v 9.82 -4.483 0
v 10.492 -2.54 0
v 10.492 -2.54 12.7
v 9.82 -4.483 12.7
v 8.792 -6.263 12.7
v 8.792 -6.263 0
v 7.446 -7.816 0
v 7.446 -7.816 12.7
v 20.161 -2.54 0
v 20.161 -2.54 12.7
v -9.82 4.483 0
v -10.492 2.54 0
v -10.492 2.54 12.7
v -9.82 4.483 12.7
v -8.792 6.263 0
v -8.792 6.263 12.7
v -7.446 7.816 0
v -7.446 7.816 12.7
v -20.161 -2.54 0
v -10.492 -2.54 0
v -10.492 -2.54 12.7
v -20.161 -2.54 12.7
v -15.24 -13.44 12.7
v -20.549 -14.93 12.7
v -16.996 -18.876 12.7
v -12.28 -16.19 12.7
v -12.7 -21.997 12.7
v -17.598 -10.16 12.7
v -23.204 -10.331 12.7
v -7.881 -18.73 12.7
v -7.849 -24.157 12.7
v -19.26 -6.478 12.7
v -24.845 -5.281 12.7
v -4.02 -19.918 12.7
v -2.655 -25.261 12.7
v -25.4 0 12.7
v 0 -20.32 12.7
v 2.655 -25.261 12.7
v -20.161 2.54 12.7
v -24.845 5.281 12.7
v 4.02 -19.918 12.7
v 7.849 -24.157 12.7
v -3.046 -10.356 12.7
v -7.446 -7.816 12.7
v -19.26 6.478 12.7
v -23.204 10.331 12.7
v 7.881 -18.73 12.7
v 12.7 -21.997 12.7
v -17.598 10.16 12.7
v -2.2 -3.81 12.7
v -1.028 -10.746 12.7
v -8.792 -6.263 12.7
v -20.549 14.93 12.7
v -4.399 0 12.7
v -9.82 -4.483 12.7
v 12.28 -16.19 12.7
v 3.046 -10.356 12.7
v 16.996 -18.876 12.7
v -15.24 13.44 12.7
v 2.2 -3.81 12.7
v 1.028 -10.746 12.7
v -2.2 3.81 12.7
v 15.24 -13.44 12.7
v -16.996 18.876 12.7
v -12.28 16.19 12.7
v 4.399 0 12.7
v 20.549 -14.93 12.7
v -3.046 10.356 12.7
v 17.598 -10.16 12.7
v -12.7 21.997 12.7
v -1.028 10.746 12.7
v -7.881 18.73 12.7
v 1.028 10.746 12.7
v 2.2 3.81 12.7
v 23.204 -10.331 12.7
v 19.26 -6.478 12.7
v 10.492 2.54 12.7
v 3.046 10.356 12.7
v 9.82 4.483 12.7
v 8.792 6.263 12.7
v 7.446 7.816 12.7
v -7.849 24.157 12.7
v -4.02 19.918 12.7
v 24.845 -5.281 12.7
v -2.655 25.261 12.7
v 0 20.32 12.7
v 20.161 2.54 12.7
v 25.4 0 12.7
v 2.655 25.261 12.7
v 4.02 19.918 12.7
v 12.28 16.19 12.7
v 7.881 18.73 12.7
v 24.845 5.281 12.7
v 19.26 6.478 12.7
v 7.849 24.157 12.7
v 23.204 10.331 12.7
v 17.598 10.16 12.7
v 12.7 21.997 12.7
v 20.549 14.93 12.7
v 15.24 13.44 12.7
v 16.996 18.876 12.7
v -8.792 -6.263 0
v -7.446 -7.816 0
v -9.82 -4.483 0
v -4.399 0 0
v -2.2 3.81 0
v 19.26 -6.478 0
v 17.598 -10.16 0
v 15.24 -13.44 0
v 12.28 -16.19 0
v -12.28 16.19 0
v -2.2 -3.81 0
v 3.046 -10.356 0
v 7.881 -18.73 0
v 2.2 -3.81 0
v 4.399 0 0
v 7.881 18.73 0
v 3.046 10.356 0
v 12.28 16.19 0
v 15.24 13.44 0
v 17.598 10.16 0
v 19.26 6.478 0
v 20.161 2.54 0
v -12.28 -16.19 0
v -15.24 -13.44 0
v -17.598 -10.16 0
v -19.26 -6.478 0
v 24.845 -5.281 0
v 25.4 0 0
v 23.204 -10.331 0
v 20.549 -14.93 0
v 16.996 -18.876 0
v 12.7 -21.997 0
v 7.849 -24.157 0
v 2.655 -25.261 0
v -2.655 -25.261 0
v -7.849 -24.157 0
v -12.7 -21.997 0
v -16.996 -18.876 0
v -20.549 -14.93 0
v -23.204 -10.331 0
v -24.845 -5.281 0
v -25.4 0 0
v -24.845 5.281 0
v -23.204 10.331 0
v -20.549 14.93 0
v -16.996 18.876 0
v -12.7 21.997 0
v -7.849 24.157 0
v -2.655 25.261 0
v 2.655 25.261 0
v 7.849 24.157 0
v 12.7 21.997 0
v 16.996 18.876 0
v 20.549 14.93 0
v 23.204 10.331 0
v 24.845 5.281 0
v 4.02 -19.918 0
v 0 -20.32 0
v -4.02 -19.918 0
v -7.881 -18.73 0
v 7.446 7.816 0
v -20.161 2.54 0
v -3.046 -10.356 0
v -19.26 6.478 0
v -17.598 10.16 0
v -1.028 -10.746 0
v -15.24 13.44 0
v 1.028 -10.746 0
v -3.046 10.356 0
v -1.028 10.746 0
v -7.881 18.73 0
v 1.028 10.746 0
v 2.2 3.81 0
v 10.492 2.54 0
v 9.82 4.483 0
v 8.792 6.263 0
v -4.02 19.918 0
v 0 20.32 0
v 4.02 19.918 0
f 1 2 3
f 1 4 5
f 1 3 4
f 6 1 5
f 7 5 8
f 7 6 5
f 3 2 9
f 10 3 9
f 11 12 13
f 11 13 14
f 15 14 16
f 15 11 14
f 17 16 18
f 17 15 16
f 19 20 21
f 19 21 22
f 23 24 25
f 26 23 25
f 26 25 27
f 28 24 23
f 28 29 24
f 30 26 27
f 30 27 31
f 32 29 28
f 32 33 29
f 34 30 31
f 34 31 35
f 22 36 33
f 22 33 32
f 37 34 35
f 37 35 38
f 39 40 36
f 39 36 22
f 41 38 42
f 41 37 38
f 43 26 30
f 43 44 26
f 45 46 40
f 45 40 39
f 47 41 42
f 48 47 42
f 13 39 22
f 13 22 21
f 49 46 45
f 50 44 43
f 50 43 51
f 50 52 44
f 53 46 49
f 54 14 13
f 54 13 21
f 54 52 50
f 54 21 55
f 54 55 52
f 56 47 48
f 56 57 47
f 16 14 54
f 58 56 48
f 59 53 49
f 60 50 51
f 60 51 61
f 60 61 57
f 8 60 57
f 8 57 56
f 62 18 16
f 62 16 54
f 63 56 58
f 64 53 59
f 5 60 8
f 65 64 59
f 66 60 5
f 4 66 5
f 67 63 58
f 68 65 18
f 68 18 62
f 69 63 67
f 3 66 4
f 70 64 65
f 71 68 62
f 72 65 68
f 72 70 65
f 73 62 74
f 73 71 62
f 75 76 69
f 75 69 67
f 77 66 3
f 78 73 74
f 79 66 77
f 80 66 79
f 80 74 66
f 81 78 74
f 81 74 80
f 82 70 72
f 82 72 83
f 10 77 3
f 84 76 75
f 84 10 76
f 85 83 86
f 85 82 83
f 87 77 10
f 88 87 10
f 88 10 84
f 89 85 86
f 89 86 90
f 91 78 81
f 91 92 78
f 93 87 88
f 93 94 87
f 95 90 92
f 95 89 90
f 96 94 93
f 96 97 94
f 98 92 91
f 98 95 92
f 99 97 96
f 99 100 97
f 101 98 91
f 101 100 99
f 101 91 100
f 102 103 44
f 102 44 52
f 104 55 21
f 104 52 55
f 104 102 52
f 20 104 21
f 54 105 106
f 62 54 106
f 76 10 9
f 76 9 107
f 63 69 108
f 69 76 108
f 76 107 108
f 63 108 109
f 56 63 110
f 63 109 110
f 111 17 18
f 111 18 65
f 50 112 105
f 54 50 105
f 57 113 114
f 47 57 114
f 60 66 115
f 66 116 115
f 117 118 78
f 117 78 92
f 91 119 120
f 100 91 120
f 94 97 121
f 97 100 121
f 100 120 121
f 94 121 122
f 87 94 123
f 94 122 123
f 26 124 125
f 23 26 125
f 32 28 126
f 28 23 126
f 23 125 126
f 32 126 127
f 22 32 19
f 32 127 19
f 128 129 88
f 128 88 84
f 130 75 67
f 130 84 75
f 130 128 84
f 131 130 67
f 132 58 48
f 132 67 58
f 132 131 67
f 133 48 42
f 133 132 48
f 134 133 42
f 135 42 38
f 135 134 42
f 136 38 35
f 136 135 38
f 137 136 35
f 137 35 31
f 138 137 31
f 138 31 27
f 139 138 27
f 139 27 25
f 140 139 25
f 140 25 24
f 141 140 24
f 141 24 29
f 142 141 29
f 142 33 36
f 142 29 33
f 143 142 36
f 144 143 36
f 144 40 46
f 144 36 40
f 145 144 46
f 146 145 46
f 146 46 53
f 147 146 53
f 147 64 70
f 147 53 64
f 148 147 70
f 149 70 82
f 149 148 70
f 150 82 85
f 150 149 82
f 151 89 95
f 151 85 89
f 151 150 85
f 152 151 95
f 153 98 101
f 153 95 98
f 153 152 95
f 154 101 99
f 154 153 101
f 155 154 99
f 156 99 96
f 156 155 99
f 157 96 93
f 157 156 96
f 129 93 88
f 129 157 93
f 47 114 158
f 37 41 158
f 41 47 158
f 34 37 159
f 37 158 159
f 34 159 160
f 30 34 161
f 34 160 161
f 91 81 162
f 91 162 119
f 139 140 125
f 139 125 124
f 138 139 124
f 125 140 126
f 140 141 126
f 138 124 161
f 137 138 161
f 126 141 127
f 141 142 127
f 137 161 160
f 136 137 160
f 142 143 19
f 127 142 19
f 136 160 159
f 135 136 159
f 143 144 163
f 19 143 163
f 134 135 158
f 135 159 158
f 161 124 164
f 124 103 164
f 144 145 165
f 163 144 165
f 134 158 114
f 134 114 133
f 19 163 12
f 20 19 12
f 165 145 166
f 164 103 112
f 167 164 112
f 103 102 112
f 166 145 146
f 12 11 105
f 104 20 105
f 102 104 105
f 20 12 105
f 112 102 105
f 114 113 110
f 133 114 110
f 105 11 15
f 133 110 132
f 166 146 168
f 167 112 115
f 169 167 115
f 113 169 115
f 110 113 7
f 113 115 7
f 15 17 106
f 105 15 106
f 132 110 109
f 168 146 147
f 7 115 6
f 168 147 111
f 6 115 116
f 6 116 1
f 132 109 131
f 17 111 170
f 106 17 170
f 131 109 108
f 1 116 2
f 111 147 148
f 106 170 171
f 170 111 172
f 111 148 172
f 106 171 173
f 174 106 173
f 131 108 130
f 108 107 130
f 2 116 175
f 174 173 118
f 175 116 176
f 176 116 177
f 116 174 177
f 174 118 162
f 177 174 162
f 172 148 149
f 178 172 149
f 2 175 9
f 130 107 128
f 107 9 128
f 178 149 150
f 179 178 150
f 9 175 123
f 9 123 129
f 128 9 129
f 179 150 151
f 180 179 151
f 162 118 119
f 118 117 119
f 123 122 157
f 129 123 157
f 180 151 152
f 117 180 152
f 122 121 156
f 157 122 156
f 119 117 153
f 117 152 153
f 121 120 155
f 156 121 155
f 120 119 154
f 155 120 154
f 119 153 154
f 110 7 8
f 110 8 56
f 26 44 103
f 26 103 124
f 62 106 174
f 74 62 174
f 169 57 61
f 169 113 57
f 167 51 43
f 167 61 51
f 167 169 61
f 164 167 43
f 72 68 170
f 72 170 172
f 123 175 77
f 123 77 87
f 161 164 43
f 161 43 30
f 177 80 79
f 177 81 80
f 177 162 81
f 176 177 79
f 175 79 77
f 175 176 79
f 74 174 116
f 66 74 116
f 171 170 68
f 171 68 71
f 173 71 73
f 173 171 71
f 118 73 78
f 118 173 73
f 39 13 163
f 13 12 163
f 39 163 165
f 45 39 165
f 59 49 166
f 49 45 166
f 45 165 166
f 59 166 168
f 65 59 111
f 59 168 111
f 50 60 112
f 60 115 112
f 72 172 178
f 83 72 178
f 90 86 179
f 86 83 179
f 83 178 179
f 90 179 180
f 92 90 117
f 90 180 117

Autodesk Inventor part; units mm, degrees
ref_plane "YZ Plane" through (0, 0, 0) normal (1, 0, 0) x (0, 1, 0)
ref_plane "XZ Plane" through (0, 0, 0) normal (0, 1, 0) x (-1, 0, 0)
ref_plane "XY Plane" through (0, 0, 0) normal (0, 0, 1) x (1, 0, 0)
sketch "Sketch1" plane through (0, 0, 0) normal (0, 0, 1) x (1, 0, 0)
  line L0 (2.1997, 3.81) -> (4.3994, 0)
  line L1 (4.3994, 0) -> (2.1997, -3.81)
  line L2 (2.1997, -3.81) -> (-2.1997, -3.81)
  line L3 (-2.1997, -3.81) -> (-4.3994, 0)
  line L4 (-4.3994, 0) -> (-2.1997, 3.81)
  line L5 (-2.1997, 3.81) -> (2.1997, 3.81)
  line L6 (0, 0) -> (1.743, 0)
  circle A0 centre (0, 0) radius 10.795
  circle A1 centre (0, 0) radius 25.4
  circle A2 centre (0, 0) radius 20.32
  line L7 (-4.3994, 0) -> (-20.32, 0)
  line L8 (-2.1997, 3.81) -> (-10.16, 17.5976)
  line L9 (2.1997, 3.81) -> (10.16, 17.5976)
  line L10 (4.3994, 0) -> (20.32, 0)
  line L11 (2.1997, -3.81) -> (10.16, -17.5976)
  line L12 (-2.1997, -3.81) -> (-10.16, -17.5976)
  line L13 (-2.9329, 2.54) -> (-20.1606, 2.54)
  line L14 (-2.9329, -2.54) -> (-20.1606, -2.54)
  line L15 (-3.6662, -1.27) -> (-12.28, -16.1896)
  line L16 (0.7332, -3.81) -> (-7.8806, -18.7296)
  line L17 (-0.7332, -3.81) -> (7.8806, -18.7296)
  line L18 (3.6662, -1.27) -> (12.28, -16.1896)
  line L19 (2.9329, 2.54) -> (20.1606, 2.54)
  line L20 (2.9329, -2.54) -> (20.1606, -2.54)
  line L21 (-7.4457, 7.8163) -> (-12.28, 16.1896)
  line L22 (-3.0463, 10.3563) -> (-7.8806, 18.7296)
  line L23 (-0.7332, 3.81) -> (7.8806, 18.7296)
  line L24 (3.6662, 1.27) -> (12.28, 16.1896)
  dimension "d0" = 7.62
  dimension "d1" = 21.59
  dimension "d2" = 50.8
  dimension "d3" = 5.08
  dimension "d4" = 120
  dimension "d5" = 120
  dimension "d6" = 120
  dimension "d7" = 120
  dimension "d8" = 5.08
  dimension "d9" = 2.54
  dimension "d10" = 5.08
  dimension "d11" = 2.54
  dimension "d13" = 2.54
  dimension "d14" = 5.08
  dimension "d15" = 5.08
  dimension "d17" = 2.54
  dimension "d18" = 2.54
  dimension "d19" = 2.54
  dimension "d20" = 5.08
  dimension "d21" = 2.54
extrude "Extrusion1" add sketch "Sketch1" along normal blind 12.7 contours L9 A0 L24 L19 L0 | L5 L23 A0 L9 | L19 L24 L0 | L5 L8 A0 L23 | L9 A2 L24 A0 | A0 L23 A2 L9 | L24 L19 A0 L10 L0 | L24 A0 L19 | L4 L13 A0 L8 | L10 A0 L20 L18 L1 | L19 A2 L10 A0 | L4 L7 A0 L13 | L8 A2 L22 A0 | A0 L21 A2 L8 | L18 L20 L1 | L10 A2 L20 A0 | L3 L15 L14 A0 L7 | A0 L7 A2 L13 | L20 L18 A0 L11 L1 | L20 A0 L18 | L3 L14 L15 | A0 L14 A2 L7 | L11 A0 L17 L16 L2 | L18 A2 L11 A0 | L3 L12 A0 L15 L14 | L15 A0 L14 | L16 L17 L2 | L11 A2 L17 A0 | L2 L17 L16 A0 L12 | A0 L12 A2 L15 | L17 A0 L16 | A0 L16 A2 L12 | A1
equation "\"d5\" = d4"
equation "\"d6\" = d4"
equation "\"d7\" = d4"
properties part number "RobotArm Wheel2"
